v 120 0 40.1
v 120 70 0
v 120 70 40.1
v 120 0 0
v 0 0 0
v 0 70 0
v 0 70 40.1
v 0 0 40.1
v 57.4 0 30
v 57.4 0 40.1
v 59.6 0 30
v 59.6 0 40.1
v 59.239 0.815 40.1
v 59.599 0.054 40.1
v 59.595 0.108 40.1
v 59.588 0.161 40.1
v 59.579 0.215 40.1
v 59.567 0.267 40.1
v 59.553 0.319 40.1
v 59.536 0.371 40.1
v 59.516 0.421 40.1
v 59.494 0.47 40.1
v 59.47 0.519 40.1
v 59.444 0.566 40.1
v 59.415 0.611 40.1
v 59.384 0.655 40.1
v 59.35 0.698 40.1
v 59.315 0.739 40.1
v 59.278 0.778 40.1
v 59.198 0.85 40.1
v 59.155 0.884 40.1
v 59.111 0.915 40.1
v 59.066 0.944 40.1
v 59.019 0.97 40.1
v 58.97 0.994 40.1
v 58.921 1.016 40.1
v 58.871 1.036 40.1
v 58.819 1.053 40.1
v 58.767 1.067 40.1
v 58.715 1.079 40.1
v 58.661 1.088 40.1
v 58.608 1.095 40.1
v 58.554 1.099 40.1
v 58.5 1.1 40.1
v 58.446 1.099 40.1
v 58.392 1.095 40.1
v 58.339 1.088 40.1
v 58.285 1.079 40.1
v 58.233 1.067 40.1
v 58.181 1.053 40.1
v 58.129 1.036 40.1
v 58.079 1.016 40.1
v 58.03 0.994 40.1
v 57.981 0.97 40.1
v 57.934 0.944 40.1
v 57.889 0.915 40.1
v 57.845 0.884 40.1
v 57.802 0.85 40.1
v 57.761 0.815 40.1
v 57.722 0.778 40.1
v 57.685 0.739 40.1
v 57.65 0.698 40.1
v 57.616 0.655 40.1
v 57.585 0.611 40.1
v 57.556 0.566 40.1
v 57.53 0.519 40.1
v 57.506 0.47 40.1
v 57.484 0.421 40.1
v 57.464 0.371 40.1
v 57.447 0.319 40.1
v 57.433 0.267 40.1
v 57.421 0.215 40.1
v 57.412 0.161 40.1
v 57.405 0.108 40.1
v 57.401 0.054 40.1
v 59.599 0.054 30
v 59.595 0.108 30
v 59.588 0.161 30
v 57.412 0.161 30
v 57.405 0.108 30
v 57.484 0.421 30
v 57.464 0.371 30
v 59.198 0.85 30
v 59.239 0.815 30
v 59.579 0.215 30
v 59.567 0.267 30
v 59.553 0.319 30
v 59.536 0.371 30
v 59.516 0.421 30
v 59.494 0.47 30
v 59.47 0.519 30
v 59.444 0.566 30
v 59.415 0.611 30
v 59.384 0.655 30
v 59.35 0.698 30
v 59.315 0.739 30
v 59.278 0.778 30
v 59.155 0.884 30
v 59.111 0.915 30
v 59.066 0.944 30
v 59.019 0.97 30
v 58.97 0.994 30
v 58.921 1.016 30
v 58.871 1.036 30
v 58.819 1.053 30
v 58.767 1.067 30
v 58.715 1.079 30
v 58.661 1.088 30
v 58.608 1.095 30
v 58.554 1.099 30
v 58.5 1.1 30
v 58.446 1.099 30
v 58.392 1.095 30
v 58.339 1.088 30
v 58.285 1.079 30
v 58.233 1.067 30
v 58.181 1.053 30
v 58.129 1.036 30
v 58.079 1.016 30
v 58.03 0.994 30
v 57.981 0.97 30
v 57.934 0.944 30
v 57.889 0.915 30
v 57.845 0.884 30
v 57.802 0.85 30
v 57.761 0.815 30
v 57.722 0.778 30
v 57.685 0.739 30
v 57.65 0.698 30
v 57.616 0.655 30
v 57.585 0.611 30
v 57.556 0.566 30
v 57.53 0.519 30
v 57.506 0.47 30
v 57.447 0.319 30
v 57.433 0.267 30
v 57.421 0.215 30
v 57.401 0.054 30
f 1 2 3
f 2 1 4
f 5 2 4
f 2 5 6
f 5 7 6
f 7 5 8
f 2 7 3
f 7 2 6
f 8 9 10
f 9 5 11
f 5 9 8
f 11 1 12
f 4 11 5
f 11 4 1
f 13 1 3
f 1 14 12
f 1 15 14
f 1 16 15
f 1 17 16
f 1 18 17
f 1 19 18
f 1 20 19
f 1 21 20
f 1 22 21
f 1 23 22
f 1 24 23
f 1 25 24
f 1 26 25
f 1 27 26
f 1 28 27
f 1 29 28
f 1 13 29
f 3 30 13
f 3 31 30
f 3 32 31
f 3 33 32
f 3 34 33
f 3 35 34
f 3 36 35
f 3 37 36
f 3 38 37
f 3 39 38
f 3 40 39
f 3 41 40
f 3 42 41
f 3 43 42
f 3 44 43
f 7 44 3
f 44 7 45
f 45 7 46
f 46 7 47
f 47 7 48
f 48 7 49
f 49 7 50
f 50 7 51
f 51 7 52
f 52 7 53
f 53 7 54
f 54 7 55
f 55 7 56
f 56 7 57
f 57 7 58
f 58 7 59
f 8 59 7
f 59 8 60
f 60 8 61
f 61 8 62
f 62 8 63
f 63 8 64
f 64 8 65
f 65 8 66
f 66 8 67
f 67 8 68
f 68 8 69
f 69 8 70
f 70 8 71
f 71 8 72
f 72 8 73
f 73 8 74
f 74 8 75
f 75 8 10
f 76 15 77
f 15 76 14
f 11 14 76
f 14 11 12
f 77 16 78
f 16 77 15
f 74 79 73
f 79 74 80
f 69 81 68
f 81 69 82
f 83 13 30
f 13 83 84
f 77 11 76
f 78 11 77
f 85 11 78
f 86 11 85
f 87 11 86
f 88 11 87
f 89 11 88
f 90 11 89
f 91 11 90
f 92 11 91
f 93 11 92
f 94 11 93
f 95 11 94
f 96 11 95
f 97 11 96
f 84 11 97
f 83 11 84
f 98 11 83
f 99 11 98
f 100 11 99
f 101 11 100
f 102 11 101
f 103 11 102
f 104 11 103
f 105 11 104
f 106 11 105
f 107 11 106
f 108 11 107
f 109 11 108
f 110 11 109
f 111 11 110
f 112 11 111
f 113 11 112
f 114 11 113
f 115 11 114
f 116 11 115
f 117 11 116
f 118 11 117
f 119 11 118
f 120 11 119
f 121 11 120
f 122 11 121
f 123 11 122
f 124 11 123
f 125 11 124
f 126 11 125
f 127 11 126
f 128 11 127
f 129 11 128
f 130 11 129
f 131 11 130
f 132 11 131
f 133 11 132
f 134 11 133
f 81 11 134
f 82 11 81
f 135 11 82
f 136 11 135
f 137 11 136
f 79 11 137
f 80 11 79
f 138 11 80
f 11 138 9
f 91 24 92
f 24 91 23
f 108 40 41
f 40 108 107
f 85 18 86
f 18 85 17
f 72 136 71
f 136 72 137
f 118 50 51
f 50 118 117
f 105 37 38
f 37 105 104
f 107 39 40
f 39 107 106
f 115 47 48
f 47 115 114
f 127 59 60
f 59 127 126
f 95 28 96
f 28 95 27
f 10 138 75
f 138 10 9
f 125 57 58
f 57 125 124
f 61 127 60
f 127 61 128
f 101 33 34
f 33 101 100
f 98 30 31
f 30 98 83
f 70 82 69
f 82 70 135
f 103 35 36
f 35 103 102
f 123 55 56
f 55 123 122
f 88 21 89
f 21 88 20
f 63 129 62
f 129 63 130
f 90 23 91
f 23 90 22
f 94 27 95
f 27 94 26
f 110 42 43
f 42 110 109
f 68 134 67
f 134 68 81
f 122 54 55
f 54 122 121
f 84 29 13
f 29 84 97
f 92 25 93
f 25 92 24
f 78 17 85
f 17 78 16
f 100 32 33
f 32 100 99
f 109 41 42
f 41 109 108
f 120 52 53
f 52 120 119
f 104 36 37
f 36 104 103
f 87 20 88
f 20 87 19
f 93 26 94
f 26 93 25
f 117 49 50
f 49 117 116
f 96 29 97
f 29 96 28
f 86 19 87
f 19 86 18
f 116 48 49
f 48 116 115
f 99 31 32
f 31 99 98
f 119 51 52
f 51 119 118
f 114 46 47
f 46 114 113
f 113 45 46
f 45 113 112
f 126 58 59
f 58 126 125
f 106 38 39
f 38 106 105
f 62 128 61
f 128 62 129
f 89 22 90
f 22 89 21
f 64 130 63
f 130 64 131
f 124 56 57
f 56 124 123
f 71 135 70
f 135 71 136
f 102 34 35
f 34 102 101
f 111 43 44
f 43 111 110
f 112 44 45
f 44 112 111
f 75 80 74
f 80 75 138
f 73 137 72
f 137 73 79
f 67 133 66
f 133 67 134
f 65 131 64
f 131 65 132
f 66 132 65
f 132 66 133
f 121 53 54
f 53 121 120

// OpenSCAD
// Buffer Tank for Mini Horizontal Gel Electrophoresis
// Units: millimetres

// Outer Dimensions
$w_outer = 120; // Width (X)
$d_outer = 70;  // Depth (Y)
$h_outer = 40;  // Height (Z)

// Wall and Floor Thickness
$wall_thick = 3;
$floor_thick = 3;

// Platform Dimensions
$plat_len = 60;   // Length in X
$plat_width = $d_outer - 2*$wall_thick; // Spans full inner width (Y)
$plat_height = 10; // Height above inner floor

// Hole Dimensions
$hole_dia = 2;
$hole_y = 0;
$hole_z = 30;

// Configuration
$fn = 128; // High resolution for smooth curves

// Derived Dimensions
$inner_w = $w_outer - 2*$wall_thick;
$inner_d = $d_outer - 2*$wall_thick;
$inner_h = $h_outer - $floor_thick;
$inner_floor_z = $floor_thick;

// Main assembly
difference() {
    union() {
        // Main Tank Block
        translate([0, 0, 0]) {
            cube([
                $w_outer, 
                $d_outer, 
                $h_outer
            ]);
        }
        
        // Cut Top (Open Tank)
        translate([0, 0, $h_outer - $wall_thick]) {
            cube([
                $w_outer, 
                $d_outer, 
                $wall_thick + 0.1
            ]);
        }
        
        // Cut Floor
        translate([0, 0, 0]) {
            cube([
                $w_outer, 
                $d_outer, 
                $floor_thick + 0.1
            ]);
        }
        
        // Raised Platform
        translate([
            ($w_outer - $plat_len) / 2, 
            0, 
            $inner_floor_z + $plat_height
        ]) {
            cube([
                $plat_len,
                $plat_width,
                $plat_height
            ]);
        }
    }
    
    // Drill Holes
    // Left end wall hole
    translate([
        -$w_outer/2 + $wall_thick/2, 
        $hole_y,
        $hole_z
    ]) {
        cylinder(
            h = $w_outer - 2*$wall_thick + 0.1, 
            r = $hole_dia/2 + 0.1,
            $fn = $fn
        );
    }
    
    // Right end wall hole
    translate([
        $w_outer/2 - $wall_thick/2, 
        $hole_y,
        $hole_z
    ]) {
        cylinder(
            h = $w_outer - 2*$wall_thick + 0.1, 
            r = $hole_dia/2 + 0.1,
            $fn = $fn
        );
    }
}
